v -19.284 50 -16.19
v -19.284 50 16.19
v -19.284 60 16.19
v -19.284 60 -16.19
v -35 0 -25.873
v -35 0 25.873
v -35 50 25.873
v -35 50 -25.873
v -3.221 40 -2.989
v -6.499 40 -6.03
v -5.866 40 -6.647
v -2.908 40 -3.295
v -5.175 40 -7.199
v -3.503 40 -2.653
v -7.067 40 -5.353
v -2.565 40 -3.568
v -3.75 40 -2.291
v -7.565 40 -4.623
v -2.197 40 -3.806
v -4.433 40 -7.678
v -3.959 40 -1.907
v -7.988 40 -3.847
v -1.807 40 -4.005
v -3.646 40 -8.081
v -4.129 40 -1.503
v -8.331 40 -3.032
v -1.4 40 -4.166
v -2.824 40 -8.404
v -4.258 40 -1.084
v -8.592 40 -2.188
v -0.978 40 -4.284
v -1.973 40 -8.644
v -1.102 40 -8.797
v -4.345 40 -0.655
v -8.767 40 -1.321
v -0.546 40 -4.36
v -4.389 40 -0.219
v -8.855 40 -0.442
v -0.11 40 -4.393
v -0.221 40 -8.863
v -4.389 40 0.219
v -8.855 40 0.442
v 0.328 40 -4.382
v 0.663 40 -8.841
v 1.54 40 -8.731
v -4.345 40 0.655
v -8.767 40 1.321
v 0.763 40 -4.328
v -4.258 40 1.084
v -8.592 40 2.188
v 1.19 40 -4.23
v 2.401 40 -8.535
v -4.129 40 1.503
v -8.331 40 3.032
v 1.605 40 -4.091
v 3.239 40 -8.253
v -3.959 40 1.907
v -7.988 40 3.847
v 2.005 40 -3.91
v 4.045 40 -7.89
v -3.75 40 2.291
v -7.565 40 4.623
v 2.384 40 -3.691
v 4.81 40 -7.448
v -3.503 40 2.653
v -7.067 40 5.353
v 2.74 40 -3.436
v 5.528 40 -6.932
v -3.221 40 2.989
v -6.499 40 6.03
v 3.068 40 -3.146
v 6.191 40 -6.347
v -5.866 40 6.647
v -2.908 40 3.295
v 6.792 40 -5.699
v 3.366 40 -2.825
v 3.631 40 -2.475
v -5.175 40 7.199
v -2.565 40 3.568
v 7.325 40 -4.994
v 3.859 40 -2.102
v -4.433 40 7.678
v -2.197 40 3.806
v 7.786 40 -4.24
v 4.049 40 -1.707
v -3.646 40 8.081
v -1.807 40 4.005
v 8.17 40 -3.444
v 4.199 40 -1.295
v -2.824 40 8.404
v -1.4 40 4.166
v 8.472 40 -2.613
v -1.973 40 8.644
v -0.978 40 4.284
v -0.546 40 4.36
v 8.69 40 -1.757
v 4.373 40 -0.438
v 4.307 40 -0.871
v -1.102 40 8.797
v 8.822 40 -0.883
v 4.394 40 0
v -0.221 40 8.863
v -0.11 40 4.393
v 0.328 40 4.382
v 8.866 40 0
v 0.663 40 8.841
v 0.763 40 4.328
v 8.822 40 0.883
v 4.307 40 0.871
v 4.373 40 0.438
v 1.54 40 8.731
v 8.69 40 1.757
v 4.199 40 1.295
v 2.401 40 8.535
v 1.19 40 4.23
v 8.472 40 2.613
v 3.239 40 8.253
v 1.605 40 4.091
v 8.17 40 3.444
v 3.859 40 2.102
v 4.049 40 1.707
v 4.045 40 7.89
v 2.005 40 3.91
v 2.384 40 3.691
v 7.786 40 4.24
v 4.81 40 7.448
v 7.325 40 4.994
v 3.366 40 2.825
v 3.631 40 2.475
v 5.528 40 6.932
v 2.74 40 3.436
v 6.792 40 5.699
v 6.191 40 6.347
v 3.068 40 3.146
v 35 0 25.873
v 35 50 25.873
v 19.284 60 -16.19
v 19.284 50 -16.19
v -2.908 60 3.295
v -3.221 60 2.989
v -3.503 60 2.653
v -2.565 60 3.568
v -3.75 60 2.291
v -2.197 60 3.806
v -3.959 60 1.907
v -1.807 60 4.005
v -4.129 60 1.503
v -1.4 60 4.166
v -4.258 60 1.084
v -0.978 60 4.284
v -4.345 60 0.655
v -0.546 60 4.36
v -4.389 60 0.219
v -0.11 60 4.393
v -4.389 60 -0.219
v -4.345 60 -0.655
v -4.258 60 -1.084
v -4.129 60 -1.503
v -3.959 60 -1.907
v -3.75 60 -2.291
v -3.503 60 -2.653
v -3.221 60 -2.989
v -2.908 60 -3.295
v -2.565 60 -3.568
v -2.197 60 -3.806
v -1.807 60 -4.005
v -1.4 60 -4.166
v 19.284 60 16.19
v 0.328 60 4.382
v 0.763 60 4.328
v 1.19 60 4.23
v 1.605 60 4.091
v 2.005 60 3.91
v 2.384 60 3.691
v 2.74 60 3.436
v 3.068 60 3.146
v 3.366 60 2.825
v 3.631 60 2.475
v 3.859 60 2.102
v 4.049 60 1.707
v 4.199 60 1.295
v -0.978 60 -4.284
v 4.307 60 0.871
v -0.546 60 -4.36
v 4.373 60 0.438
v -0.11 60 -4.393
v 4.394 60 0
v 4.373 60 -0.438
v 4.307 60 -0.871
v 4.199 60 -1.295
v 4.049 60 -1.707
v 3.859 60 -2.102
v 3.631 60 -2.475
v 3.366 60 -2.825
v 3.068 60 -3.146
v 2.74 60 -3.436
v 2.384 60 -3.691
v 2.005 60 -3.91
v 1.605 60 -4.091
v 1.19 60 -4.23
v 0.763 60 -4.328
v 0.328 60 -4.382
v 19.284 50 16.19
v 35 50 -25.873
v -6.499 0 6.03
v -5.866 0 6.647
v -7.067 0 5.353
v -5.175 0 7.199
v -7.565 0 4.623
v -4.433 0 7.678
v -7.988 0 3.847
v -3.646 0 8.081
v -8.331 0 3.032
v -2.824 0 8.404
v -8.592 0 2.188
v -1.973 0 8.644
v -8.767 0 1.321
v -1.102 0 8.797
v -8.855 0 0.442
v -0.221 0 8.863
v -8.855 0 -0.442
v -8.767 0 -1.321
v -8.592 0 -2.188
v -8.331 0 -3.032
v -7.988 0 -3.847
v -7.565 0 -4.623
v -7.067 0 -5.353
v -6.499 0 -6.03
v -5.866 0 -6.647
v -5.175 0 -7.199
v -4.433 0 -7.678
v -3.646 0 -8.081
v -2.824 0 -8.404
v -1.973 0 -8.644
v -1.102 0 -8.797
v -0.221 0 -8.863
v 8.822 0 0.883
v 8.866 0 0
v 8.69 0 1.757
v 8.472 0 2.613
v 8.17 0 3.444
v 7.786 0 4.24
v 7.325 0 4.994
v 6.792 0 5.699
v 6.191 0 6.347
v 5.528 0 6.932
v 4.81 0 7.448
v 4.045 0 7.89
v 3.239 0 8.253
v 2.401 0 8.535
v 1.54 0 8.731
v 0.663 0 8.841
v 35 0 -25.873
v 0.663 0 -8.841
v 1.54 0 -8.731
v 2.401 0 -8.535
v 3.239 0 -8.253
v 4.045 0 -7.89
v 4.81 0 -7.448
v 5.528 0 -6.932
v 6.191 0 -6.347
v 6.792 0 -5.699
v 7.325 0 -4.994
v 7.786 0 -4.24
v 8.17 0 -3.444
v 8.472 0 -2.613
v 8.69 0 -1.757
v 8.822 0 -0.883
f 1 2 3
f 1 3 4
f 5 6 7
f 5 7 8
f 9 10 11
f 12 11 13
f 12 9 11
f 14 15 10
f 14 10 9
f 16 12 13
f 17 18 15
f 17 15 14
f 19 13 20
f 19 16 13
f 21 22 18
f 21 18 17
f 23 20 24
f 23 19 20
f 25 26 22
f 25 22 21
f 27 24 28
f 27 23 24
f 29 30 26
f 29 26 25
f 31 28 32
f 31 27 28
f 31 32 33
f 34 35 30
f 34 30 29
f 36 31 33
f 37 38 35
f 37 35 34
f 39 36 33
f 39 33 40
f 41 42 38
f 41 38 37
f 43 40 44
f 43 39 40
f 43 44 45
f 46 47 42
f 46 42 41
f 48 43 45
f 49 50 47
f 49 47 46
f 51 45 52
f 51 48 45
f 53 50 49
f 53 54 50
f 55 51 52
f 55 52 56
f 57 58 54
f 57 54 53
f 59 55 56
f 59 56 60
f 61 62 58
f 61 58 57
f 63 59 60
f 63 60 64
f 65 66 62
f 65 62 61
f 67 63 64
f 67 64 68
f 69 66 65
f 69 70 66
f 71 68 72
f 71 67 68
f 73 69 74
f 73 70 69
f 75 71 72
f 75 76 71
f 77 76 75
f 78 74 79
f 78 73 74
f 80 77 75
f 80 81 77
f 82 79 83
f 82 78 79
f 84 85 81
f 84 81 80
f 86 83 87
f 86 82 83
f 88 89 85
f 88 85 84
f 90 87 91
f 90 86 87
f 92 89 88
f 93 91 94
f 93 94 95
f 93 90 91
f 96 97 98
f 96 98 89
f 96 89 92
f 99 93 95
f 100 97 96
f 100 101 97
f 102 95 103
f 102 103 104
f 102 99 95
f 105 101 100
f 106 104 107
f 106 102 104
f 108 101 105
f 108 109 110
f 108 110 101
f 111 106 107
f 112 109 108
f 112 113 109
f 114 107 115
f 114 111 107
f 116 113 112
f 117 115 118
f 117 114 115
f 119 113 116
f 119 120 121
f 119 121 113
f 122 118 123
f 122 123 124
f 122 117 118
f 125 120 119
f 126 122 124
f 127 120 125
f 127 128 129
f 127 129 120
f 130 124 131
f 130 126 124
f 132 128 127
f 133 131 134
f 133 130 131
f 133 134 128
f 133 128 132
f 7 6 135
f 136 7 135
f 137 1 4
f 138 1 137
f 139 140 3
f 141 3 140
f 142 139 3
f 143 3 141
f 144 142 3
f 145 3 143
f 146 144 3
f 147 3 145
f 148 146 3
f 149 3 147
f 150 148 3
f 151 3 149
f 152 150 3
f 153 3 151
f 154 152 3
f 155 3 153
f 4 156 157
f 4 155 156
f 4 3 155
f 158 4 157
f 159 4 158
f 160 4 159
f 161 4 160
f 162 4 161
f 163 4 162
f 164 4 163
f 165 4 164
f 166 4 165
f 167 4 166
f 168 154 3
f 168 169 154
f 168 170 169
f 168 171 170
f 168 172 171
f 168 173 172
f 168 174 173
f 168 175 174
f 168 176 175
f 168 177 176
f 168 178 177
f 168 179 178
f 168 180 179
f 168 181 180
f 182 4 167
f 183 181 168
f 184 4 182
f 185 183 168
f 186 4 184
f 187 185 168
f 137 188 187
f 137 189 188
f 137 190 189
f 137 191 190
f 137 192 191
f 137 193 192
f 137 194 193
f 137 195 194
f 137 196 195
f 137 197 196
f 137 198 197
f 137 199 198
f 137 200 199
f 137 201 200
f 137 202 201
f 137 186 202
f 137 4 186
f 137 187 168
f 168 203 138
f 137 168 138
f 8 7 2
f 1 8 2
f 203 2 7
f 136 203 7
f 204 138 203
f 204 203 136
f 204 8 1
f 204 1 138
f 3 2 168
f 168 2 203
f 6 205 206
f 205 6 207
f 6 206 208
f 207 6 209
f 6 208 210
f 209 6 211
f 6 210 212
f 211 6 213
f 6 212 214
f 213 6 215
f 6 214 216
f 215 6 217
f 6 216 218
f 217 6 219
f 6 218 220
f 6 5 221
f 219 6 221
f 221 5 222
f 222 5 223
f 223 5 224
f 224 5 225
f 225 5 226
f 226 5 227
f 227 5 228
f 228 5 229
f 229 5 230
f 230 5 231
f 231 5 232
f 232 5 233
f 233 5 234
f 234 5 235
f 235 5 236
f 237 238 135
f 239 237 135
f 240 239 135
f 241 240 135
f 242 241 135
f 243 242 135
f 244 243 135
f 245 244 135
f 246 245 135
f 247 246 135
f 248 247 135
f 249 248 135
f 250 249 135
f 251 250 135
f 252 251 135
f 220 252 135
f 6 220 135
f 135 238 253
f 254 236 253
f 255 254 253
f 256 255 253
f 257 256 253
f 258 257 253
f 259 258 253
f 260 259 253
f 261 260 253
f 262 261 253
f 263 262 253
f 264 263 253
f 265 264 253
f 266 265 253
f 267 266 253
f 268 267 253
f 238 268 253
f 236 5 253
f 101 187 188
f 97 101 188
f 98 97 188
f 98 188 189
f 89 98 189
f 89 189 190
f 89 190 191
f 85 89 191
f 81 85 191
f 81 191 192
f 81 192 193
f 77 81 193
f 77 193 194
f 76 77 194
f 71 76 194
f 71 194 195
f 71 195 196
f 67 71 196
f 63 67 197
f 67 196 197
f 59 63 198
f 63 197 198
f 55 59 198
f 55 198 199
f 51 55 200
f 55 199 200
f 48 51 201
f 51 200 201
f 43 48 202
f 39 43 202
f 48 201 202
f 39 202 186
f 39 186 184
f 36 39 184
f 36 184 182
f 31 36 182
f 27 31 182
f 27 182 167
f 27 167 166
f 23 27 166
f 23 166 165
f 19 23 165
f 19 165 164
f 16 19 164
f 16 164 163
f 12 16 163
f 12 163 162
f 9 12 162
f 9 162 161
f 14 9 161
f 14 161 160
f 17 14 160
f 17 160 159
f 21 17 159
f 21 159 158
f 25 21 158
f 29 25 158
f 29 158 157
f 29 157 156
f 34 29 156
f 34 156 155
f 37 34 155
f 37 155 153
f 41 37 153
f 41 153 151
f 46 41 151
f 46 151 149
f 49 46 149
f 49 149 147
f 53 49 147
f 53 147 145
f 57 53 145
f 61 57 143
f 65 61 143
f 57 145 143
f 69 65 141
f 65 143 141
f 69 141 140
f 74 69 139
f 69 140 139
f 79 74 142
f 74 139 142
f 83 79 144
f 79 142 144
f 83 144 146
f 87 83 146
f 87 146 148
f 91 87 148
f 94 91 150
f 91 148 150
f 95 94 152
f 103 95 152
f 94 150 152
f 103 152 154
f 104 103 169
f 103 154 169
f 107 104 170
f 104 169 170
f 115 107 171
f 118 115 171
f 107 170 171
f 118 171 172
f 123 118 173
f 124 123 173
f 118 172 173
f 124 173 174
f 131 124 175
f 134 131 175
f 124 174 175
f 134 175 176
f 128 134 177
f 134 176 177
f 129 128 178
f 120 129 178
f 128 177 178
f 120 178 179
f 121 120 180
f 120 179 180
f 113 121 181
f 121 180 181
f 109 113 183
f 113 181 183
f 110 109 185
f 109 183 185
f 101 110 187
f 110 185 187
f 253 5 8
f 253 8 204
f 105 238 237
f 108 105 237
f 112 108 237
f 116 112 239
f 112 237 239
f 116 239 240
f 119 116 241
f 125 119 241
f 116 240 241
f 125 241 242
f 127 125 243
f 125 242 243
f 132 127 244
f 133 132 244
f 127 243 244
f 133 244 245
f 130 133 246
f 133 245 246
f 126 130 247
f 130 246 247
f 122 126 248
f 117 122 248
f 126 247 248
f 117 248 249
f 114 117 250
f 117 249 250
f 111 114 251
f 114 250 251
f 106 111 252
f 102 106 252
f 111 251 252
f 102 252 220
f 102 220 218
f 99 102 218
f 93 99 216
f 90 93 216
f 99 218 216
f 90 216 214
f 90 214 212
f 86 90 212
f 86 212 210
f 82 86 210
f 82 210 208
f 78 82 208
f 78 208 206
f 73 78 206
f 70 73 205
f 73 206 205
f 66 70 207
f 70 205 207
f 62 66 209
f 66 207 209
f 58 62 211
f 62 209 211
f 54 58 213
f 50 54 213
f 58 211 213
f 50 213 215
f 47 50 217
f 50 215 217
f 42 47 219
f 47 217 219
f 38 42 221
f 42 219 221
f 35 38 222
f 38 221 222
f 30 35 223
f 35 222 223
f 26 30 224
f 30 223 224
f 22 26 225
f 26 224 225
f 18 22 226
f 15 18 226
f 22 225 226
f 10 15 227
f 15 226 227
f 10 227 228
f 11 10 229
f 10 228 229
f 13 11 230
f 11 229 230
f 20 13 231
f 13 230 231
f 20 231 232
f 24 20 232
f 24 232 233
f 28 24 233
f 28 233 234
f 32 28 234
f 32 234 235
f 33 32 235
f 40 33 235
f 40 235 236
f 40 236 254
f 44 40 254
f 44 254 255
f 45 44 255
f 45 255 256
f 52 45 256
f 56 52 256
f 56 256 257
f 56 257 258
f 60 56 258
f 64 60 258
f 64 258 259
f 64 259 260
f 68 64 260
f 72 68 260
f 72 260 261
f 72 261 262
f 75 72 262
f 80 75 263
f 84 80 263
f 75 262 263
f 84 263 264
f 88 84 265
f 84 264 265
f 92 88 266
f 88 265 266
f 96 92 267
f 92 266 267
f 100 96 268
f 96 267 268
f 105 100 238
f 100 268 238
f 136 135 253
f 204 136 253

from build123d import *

# Parameters (mm, degrees)
SKETCH3_W           = 70
SKETCH3_H           = 51.746411484
BOSS_EXTRUDE4_DEPTH = 50
SKETCH5_W           = 38.568917084
SKETCH5_H           = 32.379951318
BOSS_EXTRUDE5_DEPTH = 10
SKETCH6_R           = 8.865907929
CUT_EXTRUDE1_DEPTH  = 40
SKETCH7_R           = 2.54163754
CUT_EXTRUDE2_DEPTH  = 5
SKETCH8_R           = 4.394376148
CUT_EXTRUDE3_DEPTH  = 61


with BuildPart() as part:
    # Sketch3 → Boss-Extrude4 (new body)
    with BuildSketch(Plane(origin=(0, 0, 0), x_dir=(1, 0, 0), z_dir=(0, 1, 0))):
        Rectangle(SKETCH3_W, SKETCH3_H)
    extrude(amount=BOSS_EXTRUDE4_DEPTH)

    # Sketch5 → Boss-Extrude5 (add)
    with BuildSketch(Plane(origin=(0, 50, 0), x_dir=(1, 0, 0), z_dir=(0, 1, 0))):
        Rectangle(SKETCH5_W, SKETCH5_H)
    extrude(amount=BOSS_EXTRUDE5_DEPTH)

    # Sketch6 → Cut-Extrude1 (cut)
    with BuildSketch(Plane.XZ):
        Circle(SKETCH6_R)
    extrude(amount=-CUT_EXTRUDE1_DEPTH, mode=Mode.SUBTRACT)

    # Sketch7 → Cut-Extrude2 (cut)
    with BuildSketch(Plane.XZ.offset(-40)):
        Circle(SKETCH7_R)
    extrude(amount=-CUT_EXTRUDE2_DEPTH, mode=Mode.SUBTRACT)

    # Sketch8 → Cut-Extrude3 (cut, through all)
    with BuildSketch(Plane(origin=(0, 60, 0), x_dir=(1, 0, 0), z_dir=(0, 1, 0))):
        Circle(SKETCH8_R)
    extrude(amount=-CUT_EXTRUDE3_DEPTH, mode=Mode.SUBTRACT)


solid = part.part
